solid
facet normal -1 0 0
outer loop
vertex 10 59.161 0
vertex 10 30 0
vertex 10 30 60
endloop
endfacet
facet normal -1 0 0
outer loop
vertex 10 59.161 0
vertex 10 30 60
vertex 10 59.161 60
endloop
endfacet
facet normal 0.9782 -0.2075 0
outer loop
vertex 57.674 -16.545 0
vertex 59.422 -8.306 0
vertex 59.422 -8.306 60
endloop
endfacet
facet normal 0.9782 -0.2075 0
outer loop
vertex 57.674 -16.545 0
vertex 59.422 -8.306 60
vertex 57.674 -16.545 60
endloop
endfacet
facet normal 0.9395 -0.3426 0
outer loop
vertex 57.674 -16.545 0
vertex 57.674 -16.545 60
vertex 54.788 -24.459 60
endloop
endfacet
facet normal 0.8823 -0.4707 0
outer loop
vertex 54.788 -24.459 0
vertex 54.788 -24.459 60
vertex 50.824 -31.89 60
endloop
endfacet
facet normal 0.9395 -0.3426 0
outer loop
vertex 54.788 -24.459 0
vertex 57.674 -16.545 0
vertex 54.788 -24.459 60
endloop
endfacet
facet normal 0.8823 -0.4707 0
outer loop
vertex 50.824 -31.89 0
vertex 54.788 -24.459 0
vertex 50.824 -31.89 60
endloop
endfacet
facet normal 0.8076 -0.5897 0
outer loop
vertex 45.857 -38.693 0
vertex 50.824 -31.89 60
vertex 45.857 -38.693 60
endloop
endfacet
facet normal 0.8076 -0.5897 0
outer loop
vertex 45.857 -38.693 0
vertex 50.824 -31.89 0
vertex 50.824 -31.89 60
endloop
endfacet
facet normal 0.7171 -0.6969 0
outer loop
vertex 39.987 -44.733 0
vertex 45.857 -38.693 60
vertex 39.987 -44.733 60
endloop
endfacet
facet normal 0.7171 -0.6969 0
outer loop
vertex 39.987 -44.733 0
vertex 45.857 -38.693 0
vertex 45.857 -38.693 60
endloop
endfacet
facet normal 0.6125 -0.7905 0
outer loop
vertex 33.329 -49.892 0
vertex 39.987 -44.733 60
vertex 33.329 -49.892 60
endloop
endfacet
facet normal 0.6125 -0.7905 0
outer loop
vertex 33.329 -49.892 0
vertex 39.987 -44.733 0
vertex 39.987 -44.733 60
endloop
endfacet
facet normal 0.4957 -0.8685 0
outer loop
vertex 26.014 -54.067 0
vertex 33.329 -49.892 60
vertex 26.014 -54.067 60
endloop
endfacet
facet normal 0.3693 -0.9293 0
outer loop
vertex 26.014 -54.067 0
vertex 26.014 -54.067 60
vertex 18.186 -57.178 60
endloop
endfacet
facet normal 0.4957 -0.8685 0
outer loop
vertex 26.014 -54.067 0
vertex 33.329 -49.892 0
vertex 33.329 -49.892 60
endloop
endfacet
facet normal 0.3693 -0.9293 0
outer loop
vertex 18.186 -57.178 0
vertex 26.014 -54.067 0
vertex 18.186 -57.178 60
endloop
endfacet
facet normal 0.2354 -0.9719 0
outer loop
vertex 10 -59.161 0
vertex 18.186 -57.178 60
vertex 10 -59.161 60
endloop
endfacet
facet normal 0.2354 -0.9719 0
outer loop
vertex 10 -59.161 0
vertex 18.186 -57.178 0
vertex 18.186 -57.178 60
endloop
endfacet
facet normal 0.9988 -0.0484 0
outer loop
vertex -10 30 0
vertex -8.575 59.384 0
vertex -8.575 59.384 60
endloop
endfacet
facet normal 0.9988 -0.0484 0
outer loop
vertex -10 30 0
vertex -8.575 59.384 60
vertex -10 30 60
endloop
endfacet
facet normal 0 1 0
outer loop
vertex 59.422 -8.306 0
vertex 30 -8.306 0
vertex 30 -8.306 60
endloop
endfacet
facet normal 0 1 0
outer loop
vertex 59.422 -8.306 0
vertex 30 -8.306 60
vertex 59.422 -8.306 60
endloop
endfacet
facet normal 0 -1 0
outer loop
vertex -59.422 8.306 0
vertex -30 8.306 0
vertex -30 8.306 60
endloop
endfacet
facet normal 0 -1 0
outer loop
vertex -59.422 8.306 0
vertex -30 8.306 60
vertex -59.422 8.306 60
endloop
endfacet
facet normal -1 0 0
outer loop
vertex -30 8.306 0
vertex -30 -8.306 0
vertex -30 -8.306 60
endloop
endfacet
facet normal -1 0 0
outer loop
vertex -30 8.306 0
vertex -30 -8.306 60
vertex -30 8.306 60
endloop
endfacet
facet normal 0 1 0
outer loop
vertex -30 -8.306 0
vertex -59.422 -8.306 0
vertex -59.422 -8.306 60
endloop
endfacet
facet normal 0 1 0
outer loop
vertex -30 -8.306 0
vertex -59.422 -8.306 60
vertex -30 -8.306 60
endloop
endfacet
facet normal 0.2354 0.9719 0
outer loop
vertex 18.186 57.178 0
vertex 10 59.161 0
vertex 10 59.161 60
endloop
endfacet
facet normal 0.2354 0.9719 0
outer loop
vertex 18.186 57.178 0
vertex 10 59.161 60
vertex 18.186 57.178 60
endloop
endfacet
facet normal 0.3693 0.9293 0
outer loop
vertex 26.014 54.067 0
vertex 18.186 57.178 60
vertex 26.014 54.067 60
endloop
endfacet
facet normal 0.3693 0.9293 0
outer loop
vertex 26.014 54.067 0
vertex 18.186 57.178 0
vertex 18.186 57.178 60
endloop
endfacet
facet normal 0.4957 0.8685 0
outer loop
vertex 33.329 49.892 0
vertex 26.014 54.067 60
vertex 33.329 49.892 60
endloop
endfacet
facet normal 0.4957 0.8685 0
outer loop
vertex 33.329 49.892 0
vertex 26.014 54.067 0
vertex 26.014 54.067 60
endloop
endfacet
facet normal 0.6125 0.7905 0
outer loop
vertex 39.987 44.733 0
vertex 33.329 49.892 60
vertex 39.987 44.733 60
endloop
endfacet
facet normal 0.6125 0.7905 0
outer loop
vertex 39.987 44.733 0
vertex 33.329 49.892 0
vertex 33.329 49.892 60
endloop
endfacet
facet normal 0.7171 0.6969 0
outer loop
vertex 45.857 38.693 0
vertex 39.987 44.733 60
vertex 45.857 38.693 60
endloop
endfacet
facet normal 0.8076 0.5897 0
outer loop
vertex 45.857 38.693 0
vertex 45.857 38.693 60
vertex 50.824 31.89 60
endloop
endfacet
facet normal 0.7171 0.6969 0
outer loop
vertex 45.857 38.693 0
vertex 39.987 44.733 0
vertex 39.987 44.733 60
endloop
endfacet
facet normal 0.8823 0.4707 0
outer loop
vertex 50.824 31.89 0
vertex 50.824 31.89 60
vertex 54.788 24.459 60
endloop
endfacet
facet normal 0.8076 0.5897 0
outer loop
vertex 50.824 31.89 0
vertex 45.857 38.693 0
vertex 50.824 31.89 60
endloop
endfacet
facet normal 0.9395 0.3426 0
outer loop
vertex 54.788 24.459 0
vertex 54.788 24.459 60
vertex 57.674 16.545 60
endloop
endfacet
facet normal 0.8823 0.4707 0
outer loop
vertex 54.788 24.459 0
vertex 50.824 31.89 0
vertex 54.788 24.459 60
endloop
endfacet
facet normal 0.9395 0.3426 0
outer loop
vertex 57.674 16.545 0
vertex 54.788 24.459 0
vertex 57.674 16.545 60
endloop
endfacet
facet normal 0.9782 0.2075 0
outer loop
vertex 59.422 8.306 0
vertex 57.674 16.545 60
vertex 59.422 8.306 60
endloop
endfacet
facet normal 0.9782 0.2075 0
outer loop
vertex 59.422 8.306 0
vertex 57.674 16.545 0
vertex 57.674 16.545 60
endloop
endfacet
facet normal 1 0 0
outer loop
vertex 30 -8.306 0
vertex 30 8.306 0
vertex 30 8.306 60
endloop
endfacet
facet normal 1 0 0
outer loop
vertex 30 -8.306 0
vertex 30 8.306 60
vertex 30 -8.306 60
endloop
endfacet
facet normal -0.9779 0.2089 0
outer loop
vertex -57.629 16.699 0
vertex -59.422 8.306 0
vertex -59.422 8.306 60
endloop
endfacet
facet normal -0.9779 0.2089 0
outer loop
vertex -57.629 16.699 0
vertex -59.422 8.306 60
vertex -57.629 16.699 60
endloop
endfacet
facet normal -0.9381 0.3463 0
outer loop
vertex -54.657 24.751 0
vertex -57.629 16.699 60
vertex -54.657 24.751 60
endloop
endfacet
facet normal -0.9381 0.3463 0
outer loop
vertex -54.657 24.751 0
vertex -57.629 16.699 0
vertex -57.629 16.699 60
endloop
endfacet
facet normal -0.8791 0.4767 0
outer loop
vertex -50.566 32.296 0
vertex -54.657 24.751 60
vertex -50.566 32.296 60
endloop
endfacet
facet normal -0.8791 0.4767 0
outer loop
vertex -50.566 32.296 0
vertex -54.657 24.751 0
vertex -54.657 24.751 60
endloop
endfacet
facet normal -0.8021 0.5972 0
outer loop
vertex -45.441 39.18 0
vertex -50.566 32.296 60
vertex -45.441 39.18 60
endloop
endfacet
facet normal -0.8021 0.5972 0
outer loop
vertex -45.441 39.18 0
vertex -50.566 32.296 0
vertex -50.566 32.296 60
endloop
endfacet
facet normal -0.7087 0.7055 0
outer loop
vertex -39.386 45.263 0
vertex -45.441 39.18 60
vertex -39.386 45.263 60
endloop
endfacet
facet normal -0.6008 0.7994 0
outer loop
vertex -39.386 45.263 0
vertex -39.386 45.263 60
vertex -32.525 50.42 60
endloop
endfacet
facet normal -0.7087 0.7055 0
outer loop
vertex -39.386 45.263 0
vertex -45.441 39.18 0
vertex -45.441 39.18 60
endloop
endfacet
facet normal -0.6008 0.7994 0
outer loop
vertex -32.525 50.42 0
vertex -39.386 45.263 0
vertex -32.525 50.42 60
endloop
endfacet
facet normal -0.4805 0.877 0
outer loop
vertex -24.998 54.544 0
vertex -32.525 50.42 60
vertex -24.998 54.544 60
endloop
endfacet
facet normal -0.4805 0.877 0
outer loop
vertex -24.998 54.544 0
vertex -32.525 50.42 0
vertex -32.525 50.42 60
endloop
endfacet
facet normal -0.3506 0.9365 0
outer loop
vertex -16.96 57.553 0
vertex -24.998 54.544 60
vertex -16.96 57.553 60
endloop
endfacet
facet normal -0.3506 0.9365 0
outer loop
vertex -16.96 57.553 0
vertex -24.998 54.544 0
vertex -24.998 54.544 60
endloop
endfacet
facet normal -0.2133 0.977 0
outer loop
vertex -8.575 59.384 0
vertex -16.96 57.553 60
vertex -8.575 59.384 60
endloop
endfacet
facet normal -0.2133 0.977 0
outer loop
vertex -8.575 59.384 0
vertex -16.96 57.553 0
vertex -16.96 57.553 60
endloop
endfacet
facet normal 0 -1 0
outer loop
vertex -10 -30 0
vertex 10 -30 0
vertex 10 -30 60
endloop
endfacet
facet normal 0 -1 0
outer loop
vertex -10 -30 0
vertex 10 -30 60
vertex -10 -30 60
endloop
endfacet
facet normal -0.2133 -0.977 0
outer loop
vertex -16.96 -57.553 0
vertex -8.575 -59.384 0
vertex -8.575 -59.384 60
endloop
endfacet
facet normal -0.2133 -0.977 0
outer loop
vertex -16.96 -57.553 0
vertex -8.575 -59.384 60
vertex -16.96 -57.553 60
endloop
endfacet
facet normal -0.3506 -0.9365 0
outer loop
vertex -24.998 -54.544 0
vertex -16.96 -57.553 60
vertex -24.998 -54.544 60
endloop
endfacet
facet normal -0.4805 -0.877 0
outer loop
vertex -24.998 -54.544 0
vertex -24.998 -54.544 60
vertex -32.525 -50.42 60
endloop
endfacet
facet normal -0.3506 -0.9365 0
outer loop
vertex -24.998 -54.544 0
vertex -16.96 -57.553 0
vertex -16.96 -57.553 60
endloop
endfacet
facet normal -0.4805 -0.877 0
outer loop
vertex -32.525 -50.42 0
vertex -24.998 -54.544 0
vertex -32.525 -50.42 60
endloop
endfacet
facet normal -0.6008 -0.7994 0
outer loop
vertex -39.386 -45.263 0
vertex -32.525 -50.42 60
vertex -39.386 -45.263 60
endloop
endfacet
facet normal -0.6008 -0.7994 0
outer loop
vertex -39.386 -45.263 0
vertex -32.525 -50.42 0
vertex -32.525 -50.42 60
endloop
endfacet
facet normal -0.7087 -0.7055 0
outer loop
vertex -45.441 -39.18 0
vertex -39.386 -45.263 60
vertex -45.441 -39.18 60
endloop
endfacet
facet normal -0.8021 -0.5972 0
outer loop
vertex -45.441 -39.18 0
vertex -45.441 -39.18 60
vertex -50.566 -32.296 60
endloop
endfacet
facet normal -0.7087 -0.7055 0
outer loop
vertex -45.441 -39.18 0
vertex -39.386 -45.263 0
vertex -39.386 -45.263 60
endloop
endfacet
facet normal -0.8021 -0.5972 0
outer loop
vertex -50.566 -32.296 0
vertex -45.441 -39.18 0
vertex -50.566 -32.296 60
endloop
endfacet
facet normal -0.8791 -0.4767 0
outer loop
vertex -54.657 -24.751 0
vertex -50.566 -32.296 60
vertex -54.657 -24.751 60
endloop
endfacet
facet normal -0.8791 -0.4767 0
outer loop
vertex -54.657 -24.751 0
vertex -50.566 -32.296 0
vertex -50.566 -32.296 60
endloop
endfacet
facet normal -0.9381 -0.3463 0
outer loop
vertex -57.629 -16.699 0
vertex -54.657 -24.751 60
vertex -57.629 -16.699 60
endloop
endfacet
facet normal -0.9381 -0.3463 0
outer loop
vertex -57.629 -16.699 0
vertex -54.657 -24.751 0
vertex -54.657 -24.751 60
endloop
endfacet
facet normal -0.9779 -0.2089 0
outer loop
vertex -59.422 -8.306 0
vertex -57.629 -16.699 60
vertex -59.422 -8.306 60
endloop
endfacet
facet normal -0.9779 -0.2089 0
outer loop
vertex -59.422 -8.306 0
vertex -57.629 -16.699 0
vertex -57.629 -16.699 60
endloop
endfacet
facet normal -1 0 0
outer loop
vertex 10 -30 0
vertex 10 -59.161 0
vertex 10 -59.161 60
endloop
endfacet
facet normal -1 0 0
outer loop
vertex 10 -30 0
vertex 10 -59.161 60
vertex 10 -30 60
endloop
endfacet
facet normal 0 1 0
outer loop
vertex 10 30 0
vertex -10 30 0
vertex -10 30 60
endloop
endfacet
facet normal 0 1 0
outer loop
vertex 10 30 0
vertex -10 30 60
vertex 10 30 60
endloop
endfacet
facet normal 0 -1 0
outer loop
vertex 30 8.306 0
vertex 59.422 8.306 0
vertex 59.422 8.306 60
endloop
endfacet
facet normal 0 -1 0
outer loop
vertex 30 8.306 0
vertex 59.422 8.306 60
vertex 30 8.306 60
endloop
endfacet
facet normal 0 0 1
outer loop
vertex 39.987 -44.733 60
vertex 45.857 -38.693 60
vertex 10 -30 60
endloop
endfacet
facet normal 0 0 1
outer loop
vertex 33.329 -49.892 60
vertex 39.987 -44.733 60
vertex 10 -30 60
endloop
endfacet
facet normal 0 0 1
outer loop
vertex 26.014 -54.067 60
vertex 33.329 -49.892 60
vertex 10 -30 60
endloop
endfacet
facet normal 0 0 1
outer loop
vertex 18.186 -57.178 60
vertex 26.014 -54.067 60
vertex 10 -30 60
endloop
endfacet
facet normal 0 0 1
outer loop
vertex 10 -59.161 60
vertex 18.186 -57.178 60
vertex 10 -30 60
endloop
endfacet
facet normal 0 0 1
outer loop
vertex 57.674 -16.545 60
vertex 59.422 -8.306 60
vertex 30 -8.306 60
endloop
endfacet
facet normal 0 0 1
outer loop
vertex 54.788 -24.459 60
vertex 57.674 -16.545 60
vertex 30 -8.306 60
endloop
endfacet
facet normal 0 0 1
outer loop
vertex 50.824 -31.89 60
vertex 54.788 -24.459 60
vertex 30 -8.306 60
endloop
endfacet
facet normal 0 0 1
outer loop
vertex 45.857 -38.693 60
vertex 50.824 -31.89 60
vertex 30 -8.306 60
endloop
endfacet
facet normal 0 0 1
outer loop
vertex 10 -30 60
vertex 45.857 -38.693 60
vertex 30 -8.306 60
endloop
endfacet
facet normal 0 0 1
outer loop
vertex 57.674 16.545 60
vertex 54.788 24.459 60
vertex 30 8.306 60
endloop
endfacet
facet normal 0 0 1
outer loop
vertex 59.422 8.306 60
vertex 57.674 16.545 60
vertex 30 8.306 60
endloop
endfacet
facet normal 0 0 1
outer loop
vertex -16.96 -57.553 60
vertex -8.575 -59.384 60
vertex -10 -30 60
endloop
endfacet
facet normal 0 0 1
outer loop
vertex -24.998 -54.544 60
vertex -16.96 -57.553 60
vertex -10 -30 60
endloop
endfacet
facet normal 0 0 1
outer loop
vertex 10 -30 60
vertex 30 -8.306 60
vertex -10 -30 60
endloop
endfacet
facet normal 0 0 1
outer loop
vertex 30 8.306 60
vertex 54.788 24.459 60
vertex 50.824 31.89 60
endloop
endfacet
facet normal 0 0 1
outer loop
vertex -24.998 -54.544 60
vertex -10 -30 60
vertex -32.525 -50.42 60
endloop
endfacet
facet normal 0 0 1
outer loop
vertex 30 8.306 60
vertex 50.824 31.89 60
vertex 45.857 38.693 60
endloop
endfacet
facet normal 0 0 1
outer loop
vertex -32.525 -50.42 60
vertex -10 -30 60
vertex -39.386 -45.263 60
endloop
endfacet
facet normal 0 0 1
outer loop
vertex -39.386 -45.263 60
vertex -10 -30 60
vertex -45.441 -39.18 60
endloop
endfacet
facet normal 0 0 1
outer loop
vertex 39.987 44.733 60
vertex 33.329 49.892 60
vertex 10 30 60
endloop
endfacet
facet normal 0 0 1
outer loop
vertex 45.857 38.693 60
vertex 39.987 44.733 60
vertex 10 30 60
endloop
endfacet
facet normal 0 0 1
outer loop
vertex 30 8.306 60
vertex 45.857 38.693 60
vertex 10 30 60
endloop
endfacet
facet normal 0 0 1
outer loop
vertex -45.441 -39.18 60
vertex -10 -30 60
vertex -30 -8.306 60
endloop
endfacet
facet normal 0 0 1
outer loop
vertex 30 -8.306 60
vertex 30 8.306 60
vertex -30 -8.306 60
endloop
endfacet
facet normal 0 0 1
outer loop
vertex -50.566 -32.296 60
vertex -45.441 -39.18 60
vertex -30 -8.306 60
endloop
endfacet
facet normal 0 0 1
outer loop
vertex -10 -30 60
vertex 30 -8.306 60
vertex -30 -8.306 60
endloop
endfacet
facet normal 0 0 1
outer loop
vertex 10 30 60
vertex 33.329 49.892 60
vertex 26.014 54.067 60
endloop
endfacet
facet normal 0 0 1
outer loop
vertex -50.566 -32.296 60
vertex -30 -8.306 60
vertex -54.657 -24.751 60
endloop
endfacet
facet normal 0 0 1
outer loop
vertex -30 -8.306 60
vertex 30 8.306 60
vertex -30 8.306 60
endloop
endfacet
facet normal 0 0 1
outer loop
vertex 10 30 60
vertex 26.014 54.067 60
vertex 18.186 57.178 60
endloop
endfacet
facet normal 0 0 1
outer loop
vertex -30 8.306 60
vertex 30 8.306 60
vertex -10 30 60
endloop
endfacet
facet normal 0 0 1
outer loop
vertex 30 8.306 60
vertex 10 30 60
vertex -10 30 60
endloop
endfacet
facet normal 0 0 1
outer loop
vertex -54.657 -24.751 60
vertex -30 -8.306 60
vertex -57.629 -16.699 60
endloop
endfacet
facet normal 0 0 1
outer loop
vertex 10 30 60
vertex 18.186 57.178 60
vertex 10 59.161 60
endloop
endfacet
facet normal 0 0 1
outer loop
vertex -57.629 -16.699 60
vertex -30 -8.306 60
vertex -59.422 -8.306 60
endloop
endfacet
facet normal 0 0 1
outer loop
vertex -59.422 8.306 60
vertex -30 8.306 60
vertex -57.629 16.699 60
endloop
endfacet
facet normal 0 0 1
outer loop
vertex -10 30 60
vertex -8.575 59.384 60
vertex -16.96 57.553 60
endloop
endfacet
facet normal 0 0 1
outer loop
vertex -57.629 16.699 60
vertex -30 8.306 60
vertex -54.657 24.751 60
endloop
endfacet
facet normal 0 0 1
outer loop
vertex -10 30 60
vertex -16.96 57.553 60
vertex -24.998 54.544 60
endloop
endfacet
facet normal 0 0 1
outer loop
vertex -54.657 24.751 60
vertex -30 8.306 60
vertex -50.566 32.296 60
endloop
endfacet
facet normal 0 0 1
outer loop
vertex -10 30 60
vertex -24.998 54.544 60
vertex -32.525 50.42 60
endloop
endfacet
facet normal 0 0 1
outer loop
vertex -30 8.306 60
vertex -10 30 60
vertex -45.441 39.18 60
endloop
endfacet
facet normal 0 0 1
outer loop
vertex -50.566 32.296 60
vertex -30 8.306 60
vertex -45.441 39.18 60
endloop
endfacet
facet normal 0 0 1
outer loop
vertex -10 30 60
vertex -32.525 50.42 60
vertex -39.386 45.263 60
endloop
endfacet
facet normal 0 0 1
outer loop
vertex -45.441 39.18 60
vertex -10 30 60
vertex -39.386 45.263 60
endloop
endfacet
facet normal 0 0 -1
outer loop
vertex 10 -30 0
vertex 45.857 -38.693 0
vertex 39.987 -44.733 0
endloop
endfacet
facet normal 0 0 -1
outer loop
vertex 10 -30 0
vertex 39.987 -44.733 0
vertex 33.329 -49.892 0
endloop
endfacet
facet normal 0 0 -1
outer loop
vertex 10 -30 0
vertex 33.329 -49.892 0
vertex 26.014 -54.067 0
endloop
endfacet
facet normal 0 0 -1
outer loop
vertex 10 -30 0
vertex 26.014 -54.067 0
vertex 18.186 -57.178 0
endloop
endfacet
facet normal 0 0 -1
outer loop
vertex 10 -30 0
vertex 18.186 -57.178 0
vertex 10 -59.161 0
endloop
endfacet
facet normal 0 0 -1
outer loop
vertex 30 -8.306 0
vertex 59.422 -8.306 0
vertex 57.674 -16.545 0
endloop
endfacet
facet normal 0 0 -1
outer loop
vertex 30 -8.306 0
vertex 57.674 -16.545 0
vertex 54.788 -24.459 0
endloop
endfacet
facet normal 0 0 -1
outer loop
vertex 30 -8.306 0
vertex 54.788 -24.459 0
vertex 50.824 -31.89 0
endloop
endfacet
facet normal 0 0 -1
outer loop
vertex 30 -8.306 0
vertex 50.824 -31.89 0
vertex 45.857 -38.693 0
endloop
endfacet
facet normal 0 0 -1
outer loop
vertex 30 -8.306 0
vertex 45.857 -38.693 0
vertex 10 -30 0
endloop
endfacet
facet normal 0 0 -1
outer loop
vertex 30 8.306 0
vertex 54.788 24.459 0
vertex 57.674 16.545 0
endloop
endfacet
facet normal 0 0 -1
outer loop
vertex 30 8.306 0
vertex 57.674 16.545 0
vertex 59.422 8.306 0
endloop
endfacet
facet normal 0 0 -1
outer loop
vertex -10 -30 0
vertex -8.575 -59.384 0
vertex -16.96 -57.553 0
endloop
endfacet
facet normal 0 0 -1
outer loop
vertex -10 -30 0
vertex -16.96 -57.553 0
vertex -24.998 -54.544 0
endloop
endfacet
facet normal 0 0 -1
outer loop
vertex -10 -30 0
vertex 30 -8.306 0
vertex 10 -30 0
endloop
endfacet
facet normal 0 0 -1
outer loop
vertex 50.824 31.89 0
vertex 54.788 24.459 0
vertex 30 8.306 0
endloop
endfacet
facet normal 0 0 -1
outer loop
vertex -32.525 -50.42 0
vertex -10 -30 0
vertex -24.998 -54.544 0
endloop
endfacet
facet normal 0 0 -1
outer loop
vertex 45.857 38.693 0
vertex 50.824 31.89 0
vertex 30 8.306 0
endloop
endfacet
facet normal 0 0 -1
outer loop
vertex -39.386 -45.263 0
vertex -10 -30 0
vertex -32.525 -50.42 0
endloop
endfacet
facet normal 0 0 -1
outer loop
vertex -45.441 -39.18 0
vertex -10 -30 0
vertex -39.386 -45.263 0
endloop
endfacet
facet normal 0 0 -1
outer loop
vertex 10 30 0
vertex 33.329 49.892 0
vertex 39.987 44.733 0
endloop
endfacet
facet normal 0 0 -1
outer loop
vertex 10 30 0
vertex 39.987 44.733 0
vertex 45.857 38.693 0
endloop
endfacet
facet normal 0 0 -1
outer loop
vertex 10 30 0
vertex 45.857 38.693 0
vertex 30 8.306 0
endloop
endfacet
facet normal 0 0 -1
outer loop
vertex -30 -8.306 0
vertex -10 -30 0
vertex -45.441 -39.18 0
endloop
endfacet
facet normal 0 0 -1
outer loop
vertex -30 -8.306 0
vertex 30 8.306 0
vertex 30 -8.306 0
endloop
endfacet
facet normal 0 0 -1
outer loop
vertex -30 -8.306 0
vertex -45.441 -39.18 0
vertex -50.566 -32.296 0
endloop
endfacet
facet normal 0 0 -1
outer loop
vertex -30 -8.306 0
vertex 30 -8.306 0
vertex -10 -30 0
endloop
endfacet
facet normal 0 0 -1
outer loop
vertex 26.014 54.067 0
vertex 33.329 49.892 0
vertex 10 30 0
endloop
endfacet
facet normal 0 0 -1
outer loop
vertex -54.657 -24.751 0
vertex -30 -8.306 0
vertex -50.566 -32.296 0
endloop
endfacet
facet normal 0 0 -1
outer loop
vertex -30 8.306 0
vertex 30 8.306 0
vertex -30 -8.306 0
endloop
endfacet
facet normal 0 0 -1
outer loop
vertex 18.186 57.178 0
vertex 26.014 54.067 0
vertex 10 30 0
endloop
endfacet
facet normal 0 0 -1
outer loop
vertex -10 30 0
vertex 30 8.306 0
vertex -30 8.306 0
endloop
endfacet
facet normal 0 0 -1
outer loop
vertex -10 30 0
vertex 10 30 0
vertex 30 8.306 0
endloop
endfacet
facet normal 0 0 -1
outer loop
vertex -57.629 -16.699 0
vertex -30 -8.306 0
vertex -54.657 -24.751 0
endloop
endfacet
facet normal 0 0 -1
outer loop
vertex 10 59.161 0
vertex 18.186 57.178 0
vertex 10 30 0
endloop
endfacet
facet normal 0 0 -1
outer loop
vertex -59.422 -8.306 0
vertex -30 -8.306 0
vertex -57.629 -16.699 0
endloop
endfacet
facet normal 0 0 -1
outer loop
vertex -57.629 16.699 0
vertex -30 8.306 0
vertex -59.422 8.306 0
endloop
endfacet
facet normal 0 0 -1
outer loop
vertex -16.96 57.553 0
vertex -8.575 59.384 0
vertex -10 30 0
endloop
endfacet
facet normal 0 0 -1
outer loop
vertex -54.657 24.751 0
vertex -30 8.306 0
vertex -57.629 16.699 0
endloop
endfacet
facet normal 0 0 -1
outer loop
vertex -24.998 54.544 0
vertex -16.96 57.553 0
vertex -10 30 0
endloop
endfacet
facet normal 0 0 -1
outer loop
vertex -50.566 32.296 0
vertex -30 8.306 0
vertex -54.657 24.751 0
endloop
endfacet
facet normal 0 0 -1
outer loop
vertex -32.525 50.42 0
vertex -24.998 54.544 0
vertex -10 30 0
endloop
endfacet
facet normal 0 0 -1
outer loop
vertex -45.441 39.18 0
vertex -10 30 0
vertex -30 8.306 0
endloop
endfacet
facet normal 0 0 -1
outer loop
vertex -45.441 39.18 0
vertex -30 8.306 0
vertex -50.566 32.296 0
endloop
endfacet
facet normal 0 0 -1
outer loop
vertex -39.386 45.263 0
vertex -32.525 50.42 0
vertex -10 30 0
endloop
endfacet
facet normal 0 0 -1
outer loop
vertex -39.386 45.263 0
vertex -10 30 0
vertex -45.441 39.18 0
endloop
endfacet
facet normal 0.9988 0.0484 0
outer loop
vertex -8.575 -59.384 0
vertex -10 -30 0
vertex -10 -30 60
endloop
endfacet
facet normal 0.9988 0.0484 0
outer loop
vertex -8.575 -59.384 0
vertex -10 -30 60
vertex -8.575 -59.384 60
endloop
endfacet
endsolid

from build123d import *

# Parameters (mm, degrees)
SALIENTE_EXTRUIR1_DEPTH = 60


with BuildPart() as part:
    # Croquis1 → Saliente-Extruir1 (new body)
    with BuildSketch(Plane.XY):
        with BuildLine():
            Line((-8.57523763, 59.384049202), (-10, 30))
            Line((-10, 30), (10, 30))
            Line((10, 30), (10, 59.160797831))
            ThreePointArc((10, 59.160797831), (43.028053102, 41.816105106), (59.422289674, 8.306111602))
            Line((59.422289674, 8.306111602), (30, 8.306111602))
            Line((30, 8.306111602), (30, -8.306111602))
            Line((30, -8.306111602), (59.422289674, -8.306111602))
            ThreePointArc((59.422289674, -8.306111602), (43.028053102, -41.816105106), (10, -59.160797831))
            Line((10, -59.160797831), (10, -30))
            Line((10, -30), (-10, -30))
            Line((-10, -30), (-8.57523763, -59.384049202))
            ThreePointArc((-8.57523763, -59.384049202), (-42.52240418, -42.330191858), (-59.422289674, -8.306111602))
            Line((-59.422289674, -8.306111602), (-30, -8.306111602))
            Line((-30, -8.306111602), (-30, 8.306111602))
            Line((-30, 8.306111602), (-59.422289674, 8.306111602))
            ThreePointArc((-59.422289674, 8.306111602), (-42.52240418, 42.330191858), (-8.57523763, 59.384049202))
        make_face()
    extrude(amount=SALIENTE_EXTRUIR1_DEPTH)


solid = part.part
